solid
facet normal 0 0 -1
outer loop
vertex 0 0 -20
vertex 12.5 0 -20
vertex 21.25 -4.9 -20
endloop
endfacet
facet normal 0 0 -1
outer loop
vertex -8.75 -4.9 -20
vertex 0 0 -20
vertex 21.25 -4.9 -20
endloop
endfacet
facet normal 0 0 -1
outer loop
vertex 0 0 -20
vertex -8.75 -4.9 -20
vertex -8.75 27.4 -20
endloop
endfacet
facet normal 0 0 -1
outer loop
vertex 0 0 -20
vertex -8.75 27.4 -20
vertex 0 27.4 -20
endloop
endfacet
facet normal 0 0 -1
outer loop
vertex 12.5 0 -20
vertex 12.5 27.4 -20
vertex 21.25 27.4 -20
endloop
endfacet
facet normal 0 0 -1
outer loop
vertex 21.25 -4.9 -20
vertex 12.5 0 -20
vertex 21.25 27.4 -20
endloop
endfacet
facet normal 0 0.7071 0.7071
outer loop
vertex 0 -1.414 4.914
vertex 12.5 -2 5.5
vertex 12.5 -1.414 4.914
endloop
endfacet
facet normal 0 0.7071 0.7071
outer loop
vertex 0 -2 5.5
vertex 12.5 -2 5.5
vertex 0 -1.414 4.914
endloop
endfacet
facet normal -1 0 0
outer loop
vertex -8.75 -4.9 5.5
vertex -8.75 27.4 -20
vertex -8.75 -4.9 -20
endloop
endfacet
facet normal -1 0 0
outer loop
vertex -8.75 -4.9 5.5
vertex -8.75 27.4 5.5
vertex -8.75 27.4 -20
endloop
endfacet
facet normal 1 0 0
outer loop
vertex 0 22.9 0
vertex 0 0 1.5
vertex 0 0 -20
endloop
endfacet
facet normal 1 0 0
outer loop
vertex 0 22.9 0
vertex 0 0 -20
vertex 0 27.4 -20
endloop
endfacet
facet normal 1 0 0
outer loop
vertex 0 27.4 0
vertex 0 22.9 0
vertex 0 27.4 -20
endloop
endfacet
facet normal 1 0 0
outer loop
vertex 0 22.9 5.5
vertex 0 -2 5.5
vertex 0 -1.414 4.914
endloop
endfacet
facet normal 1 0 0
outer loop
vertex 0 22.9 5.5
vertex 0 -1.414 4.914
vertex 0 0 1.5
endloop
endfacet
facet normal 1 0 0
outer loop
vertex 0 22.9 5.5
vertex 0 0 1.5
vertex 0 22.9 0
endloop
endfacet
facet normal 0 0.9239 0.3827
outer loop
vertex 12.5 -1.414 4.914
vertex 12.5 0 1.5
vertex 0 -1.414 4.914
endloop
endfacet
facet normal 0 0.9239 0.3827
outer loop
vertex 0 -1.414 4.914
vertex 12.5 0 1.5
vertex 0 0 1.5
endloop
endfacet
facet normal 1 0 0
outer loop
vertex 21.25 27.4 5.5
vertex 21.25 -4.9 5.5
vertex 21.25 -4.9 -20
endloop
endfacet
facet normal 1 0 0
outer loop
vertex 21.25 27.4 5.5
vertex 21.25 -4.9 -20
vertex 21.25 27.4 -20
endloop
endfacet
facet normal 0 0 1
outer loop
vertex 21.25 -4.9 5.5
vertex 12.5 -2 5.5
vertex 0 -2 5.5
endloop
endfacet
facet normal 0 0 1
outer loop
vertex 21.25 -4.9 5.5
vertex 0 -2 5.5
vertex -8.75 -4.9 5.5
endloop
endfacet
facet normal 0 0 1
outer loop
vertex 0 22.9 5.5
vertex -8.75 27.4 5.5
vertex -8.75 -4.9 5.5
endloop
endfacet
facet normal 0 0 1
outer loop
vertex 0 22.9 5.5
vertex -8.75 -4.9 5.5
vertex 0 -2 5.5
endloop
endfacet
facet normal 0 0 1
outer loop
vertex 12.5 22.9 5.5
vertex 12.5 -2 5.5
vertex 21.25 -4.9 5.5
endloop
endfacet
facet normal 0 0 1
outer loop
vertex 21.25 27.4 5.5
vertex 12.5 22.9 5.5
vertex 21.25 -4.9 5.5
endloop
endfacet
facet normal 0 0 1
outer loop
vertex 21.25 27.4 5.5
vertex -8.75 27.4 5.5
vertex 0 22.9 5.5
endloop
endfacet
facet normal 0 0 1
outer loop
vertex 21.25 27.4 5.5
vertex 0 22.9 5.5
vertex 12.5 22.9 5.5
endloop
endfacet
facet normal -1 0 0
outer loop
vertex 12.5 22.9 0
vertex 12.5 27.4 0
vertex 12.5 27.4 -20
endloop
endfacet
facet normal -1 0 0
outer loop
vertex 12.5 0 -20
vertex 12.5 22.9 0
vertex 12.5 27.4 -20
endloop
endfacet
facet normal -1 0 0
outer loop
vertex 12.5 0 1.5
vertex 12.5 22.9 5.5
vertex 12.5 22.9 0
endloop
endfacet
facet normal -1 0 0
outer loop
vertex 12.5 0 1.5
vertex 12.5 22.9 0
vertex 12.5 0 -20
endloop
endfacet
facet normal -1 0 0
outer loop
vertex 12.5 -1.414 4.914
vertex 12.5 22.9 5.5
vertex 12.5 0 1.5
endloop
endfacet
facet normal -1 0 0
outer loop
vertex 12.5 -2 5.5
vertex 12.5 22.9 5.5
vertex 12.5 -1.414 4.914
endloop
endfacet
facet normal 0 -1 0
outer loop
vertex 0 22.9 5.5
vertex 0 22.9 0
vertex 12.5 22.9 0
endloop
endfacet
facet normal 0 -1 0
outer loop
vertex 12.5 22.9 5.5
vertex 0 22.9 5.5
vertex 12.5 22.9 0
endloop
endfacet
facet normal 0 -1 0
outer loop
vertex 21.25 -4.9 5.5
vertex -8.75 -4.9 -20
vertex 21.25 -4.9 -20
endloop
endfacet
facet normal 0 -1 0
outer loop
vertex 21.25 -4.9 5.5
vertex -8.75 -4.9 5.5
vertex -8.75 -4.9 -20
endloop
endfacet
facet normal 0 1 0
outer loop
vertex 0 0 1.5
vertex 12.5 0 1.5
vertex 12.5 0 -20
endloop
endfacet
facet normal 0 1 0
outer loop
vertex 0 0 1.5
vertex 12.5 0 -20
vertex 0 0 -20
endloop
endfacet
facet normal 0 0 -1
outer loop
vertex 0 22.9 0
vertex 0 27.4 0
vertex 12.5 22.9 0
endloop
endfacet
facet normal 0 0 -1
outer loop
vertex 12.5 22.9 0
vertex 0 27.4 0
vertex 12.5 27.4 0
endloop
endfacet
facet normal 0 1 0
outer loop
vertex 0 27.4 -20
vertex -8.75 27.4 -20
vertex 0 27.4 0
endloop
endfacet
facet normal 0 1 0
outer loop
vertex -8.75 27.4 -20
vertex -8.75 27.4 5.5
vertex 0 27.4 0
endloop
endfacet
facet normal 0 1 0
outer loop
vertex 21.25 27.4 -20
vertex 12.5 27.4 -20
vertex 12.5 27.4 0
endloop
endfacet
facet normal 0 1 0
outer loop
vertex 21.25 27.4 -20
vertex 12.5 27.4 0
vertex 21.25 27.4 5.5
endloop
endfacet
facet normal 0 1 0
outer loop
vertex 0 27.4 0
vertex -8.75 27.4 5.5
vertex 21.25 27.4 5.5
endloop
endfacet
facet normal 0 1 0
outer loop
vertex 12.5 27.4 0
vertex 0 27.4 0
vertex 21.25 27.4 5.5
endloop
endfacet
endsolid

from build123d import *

# Parameters (mm, degrees)
F1_W     = 30
F1_H     = 32.3
F2_DEPTH = 5.5
F0_W     = 12.5
F0_H     = 22.9
F3_DEPTH = 7
F4_W     = 8.75
F4_H     = 4.9
F4_W_2   = 12.5
F4_H_2   = 22.9
F4_H_3   = 4.5
F5_DEPTH = 20
F6_SIZE  = 2
F7_SIZE  = 2


with BuildPart() as f2:
    # F1 (on Top) → F2 (new body)
    with BuildSketch(Plane.XY):
        with Locations((6.25, 11.25)):
            Rectangle(F1_W, F1_H)
    extrude(amount=F2_DEPTH)

    # F0 (on Top) → F3 (cut)
    with BuildSketch(Plane.XY):
        with Locations((6.25, 11.45)):
            Rectangle(F0_W, F0_H)
    extrude(amount=F3_DEPTH, mode=Mode.SUBTRACT)

    # F4 (on Top) → F5 (join)
    with BuildSketch(Plane.XY):
        with Locations((-4.375, -2.45)):
            Rectangle(F4_W, F4_H)
        with Locations((6.25, -2.45)):
            Rectangle(F4_W_2, F4_H)
        with Locations((-4.375, 11.45)):
            Rectangle(F4_W, F4_H_2)
        with Locations((-4.375, 25.15)):
            Rectangle(F4_W, F4_H_3)
        with Locations((16.875, 11.45)):
            Rectangle(F4_W, F4_H_2)
        with Locations((16.875, -2.45)):
            Rectangle(F4_W, F4_H)
        with Locations((16.875, 25.15)):
            Rectangle(F4_W, F4_H_3)
    extrude(amount=-F5_DEPTH)

    # F6
    f6_edges = [f2.edges().sort_by_distance(p)[0] for p in [
        (6.25, 0, 5.5),
    ]]
    chamfer(f6_edges, length=F6_SIZE)

    # F7
    f7_edges = [f2.edges().sort_by_distance(p)[0] for p in [
        (6.25, 0, 3.5),
    ]]
    chamfer(f7_edges, length=F7_SIZE)


solid = f2.part
